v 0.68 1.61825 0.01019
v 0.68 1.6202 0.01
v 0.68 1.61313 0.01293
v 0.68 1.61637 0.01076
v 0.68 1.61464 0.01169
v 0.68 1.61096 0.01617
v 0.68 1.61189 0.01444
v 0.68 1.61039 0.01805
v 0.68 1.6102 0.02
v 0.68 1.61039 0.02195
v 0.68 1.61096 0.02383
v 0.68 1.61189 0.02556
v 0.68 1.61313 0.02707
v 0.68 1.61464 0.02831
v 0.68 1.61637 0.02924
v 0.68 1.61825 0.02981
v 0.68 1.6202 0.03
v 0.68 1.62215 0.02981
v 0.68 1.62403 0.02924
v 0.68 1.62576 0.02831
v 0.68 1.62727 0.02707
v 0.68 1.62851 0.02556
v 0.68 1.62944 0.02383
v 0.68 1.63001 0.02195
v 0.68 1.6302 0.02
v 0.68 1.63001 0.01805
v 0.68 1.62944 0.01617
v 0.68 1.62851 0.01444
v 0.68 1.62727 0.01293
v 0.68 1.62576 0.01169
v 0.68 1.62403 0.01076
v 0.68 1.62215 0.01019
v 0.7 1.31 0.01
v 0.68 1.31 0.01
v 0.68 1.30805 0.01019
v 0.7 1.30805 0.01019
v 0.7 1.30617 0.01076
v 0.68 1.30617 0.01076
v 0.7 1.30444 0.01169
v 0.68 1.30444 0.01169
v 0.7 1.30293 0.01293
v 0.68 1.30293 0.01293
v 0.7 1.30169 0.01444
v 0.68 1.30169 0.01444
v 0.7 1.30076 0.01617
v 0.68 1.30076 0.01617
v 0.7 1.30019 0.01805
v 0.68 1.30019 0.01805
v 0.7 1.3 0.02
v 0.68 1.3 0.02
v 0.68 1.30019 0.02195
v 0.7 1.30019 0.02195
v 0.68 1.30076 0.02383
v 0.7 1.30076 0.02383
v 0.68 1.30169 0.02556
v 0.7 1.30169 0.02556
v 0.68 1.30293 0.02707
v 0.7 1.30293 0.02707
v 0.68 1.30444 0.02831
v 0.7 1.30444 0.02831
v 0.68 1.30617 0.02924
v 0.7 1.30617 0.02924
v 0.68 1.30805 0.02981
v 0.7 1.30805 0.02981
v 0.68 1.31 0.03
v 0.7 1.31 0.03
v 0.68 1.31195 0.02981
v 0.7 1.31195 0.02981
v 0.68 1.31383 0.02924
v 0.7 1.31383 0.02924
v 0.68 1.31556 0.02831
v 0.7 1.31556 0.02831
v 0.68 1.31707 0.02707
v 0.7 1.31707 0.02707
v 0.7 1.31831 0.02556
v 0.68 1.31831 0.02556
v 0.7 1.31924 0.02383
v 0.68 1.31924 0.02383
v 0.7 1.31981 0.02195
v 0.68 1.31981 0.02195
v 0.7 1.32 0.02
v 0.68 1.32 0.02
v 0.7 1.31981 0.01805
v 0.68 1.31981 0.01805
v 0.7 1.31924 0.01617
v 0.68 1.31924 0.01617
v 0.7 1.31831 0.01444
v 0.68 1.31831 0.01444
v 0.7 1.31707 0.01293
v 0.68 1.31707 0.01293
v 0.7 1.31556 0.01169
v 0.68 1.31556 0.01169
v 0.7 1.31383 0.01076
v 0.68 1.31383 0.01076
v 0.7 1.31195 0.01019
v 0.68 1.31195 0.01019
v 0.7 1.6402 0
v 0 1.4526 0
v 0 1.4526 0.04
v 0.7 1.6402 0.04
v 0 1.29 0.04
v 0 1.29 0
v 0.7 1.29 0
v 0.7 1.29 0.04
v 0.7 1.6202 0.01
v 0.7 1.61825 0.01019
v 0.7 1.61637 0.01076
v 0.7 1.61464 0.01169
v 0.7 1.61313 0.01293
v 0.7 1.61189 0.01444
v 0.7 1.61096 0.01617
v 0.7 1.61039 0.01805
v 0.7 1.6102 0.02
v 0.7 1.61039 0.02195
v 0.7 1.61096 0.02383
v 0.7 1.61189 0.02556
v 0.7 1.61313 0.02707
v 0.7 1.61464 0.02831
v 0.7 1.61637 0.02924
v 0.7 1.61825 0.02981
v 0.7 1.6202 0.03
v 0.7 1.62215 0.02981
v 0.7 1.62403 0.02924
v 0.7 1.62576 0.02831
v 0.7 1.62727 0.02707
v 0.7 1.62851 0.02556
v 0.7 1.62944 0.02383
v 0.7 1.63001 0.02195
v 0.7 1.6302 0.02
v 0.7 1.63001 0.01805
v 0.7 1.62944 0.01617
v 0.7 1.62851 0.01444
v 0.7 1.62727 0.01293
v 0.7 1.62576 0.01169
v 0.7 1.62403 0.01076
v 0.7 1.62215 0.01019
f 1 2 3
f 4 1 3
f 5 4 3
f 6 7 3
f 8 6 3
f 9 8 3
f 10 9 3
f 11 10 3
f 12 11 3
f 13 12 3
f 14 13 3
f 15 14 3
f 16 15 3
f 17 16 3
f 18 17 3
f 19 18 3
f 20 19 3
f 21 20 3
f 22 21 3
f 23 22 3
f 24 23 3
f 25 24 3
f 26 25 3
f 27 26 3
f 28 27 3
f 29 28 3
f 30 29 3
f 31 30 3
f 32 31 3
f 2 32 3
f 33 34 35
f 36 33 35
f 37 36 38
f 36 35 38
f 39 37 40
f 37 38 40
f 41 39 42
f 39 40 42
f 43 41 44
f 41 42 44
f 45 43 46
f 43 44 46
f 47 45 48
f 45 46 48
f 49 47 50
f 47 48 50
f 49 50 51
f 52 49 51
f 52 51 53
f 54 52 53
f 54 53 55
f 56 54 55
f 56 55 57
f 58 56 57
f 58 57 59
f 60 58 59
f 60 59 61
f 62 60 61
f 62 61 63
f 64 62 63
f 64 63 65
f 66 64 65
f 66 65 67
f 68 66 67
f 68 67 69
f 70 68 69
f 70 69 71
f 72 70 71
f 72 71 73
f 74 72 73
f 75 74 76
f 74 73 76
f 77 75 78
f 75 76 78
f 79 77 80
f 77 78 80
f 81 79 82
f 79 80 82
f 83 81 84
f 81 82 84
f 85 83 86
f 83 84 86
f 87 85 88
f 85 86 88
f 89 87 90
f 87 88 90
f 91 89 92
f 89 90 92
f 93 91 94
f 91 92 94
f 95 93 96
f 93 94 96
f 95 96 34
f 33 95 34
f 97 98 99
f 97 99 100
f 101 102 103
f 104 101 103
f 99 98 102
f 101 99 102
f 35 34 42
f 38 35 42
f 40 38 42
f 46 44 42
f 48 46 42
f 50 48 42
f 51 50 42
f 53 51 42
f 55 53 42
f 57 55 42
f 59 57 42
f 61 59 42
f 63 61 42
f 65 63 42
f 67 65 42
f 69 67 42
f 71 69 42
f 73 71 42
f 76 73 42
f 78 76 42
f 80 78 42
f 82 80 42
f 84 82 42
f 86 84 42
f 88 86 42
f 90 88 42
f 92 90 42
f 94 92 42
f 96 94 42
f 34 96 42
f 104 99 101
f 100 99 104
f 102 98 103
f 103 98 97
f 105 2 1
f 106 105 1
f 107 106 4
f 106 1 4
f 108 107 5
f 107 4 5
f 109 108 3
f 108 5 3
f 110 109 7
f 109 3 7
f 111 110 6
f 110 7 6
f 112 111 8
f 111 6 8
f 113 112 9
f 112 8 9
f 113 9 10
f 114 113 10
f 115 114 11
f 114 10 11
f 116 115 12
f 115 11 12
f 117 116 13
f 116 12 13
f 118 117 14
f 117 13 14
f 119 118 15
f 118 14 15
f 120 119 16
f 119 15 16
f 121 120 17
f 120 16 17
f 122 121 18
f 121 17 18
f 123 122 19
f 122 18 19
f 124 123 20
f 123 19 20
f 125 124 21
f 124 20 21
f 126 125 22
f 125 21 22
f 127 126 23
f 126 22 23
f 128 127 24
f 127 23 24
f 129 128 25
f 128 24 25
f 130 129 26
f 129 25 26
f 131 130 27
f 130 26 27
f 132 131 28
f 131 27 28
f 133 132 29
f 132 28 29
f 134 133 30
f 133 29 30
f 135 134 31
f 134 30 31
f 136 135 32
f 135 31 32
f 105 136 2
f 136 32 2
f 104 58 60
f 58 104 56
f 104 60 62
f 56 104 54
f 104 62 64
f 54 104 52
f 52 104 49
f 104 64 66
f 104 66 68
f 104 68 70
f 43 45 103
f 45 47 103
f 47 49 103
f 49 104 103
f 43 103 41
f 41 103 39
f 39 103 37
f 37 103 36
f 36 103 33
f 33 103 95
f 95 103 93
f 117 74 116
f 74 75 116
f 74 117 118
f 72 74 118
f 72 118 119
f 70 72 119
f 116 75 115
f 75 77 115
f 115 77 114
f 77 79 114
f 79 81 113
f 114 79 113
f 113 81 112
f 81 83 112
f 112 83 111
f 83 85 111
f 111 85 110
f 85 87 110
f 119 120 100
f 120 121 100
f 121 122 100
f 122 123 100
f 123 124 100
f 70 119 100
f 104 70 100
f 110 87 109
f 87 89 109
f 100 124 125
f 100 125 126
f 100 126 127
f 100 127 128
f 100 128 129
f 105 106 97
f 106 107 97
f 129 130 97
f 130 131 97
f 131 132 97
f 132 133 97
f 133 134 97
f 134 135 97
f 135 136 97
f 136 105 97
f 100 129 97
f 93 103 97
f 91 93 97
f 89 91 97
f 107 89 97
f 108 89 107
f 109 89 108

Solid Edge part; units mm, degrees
sketch "Sketch1" plane through (0, 0, 0) normal (0, 0, 1) x (1, 0, 0)
  line L0 (0.7, 1.29) -> (0.7, 1.6402)
  line L1 (0, 1.4526) -> (0.7, 1.6402)
  line L2 (0, 1.4526) -> (0, 1.29)
  line L3 (0, 1.29) -> (0.7, 1.29)
extrude "Protrusion1" add sketch "Sketch1" along normal blind 0.04
hole "Bohrung_5" at (0.7, 1.6202, 0.02) direction (-1, 0, 0) diameter 0.02 depth 0.02
hole "Hole1" at (0.7, 1.31, 0.02) direction (-1, 0, 0) diameter 0.02 depth 0.02
